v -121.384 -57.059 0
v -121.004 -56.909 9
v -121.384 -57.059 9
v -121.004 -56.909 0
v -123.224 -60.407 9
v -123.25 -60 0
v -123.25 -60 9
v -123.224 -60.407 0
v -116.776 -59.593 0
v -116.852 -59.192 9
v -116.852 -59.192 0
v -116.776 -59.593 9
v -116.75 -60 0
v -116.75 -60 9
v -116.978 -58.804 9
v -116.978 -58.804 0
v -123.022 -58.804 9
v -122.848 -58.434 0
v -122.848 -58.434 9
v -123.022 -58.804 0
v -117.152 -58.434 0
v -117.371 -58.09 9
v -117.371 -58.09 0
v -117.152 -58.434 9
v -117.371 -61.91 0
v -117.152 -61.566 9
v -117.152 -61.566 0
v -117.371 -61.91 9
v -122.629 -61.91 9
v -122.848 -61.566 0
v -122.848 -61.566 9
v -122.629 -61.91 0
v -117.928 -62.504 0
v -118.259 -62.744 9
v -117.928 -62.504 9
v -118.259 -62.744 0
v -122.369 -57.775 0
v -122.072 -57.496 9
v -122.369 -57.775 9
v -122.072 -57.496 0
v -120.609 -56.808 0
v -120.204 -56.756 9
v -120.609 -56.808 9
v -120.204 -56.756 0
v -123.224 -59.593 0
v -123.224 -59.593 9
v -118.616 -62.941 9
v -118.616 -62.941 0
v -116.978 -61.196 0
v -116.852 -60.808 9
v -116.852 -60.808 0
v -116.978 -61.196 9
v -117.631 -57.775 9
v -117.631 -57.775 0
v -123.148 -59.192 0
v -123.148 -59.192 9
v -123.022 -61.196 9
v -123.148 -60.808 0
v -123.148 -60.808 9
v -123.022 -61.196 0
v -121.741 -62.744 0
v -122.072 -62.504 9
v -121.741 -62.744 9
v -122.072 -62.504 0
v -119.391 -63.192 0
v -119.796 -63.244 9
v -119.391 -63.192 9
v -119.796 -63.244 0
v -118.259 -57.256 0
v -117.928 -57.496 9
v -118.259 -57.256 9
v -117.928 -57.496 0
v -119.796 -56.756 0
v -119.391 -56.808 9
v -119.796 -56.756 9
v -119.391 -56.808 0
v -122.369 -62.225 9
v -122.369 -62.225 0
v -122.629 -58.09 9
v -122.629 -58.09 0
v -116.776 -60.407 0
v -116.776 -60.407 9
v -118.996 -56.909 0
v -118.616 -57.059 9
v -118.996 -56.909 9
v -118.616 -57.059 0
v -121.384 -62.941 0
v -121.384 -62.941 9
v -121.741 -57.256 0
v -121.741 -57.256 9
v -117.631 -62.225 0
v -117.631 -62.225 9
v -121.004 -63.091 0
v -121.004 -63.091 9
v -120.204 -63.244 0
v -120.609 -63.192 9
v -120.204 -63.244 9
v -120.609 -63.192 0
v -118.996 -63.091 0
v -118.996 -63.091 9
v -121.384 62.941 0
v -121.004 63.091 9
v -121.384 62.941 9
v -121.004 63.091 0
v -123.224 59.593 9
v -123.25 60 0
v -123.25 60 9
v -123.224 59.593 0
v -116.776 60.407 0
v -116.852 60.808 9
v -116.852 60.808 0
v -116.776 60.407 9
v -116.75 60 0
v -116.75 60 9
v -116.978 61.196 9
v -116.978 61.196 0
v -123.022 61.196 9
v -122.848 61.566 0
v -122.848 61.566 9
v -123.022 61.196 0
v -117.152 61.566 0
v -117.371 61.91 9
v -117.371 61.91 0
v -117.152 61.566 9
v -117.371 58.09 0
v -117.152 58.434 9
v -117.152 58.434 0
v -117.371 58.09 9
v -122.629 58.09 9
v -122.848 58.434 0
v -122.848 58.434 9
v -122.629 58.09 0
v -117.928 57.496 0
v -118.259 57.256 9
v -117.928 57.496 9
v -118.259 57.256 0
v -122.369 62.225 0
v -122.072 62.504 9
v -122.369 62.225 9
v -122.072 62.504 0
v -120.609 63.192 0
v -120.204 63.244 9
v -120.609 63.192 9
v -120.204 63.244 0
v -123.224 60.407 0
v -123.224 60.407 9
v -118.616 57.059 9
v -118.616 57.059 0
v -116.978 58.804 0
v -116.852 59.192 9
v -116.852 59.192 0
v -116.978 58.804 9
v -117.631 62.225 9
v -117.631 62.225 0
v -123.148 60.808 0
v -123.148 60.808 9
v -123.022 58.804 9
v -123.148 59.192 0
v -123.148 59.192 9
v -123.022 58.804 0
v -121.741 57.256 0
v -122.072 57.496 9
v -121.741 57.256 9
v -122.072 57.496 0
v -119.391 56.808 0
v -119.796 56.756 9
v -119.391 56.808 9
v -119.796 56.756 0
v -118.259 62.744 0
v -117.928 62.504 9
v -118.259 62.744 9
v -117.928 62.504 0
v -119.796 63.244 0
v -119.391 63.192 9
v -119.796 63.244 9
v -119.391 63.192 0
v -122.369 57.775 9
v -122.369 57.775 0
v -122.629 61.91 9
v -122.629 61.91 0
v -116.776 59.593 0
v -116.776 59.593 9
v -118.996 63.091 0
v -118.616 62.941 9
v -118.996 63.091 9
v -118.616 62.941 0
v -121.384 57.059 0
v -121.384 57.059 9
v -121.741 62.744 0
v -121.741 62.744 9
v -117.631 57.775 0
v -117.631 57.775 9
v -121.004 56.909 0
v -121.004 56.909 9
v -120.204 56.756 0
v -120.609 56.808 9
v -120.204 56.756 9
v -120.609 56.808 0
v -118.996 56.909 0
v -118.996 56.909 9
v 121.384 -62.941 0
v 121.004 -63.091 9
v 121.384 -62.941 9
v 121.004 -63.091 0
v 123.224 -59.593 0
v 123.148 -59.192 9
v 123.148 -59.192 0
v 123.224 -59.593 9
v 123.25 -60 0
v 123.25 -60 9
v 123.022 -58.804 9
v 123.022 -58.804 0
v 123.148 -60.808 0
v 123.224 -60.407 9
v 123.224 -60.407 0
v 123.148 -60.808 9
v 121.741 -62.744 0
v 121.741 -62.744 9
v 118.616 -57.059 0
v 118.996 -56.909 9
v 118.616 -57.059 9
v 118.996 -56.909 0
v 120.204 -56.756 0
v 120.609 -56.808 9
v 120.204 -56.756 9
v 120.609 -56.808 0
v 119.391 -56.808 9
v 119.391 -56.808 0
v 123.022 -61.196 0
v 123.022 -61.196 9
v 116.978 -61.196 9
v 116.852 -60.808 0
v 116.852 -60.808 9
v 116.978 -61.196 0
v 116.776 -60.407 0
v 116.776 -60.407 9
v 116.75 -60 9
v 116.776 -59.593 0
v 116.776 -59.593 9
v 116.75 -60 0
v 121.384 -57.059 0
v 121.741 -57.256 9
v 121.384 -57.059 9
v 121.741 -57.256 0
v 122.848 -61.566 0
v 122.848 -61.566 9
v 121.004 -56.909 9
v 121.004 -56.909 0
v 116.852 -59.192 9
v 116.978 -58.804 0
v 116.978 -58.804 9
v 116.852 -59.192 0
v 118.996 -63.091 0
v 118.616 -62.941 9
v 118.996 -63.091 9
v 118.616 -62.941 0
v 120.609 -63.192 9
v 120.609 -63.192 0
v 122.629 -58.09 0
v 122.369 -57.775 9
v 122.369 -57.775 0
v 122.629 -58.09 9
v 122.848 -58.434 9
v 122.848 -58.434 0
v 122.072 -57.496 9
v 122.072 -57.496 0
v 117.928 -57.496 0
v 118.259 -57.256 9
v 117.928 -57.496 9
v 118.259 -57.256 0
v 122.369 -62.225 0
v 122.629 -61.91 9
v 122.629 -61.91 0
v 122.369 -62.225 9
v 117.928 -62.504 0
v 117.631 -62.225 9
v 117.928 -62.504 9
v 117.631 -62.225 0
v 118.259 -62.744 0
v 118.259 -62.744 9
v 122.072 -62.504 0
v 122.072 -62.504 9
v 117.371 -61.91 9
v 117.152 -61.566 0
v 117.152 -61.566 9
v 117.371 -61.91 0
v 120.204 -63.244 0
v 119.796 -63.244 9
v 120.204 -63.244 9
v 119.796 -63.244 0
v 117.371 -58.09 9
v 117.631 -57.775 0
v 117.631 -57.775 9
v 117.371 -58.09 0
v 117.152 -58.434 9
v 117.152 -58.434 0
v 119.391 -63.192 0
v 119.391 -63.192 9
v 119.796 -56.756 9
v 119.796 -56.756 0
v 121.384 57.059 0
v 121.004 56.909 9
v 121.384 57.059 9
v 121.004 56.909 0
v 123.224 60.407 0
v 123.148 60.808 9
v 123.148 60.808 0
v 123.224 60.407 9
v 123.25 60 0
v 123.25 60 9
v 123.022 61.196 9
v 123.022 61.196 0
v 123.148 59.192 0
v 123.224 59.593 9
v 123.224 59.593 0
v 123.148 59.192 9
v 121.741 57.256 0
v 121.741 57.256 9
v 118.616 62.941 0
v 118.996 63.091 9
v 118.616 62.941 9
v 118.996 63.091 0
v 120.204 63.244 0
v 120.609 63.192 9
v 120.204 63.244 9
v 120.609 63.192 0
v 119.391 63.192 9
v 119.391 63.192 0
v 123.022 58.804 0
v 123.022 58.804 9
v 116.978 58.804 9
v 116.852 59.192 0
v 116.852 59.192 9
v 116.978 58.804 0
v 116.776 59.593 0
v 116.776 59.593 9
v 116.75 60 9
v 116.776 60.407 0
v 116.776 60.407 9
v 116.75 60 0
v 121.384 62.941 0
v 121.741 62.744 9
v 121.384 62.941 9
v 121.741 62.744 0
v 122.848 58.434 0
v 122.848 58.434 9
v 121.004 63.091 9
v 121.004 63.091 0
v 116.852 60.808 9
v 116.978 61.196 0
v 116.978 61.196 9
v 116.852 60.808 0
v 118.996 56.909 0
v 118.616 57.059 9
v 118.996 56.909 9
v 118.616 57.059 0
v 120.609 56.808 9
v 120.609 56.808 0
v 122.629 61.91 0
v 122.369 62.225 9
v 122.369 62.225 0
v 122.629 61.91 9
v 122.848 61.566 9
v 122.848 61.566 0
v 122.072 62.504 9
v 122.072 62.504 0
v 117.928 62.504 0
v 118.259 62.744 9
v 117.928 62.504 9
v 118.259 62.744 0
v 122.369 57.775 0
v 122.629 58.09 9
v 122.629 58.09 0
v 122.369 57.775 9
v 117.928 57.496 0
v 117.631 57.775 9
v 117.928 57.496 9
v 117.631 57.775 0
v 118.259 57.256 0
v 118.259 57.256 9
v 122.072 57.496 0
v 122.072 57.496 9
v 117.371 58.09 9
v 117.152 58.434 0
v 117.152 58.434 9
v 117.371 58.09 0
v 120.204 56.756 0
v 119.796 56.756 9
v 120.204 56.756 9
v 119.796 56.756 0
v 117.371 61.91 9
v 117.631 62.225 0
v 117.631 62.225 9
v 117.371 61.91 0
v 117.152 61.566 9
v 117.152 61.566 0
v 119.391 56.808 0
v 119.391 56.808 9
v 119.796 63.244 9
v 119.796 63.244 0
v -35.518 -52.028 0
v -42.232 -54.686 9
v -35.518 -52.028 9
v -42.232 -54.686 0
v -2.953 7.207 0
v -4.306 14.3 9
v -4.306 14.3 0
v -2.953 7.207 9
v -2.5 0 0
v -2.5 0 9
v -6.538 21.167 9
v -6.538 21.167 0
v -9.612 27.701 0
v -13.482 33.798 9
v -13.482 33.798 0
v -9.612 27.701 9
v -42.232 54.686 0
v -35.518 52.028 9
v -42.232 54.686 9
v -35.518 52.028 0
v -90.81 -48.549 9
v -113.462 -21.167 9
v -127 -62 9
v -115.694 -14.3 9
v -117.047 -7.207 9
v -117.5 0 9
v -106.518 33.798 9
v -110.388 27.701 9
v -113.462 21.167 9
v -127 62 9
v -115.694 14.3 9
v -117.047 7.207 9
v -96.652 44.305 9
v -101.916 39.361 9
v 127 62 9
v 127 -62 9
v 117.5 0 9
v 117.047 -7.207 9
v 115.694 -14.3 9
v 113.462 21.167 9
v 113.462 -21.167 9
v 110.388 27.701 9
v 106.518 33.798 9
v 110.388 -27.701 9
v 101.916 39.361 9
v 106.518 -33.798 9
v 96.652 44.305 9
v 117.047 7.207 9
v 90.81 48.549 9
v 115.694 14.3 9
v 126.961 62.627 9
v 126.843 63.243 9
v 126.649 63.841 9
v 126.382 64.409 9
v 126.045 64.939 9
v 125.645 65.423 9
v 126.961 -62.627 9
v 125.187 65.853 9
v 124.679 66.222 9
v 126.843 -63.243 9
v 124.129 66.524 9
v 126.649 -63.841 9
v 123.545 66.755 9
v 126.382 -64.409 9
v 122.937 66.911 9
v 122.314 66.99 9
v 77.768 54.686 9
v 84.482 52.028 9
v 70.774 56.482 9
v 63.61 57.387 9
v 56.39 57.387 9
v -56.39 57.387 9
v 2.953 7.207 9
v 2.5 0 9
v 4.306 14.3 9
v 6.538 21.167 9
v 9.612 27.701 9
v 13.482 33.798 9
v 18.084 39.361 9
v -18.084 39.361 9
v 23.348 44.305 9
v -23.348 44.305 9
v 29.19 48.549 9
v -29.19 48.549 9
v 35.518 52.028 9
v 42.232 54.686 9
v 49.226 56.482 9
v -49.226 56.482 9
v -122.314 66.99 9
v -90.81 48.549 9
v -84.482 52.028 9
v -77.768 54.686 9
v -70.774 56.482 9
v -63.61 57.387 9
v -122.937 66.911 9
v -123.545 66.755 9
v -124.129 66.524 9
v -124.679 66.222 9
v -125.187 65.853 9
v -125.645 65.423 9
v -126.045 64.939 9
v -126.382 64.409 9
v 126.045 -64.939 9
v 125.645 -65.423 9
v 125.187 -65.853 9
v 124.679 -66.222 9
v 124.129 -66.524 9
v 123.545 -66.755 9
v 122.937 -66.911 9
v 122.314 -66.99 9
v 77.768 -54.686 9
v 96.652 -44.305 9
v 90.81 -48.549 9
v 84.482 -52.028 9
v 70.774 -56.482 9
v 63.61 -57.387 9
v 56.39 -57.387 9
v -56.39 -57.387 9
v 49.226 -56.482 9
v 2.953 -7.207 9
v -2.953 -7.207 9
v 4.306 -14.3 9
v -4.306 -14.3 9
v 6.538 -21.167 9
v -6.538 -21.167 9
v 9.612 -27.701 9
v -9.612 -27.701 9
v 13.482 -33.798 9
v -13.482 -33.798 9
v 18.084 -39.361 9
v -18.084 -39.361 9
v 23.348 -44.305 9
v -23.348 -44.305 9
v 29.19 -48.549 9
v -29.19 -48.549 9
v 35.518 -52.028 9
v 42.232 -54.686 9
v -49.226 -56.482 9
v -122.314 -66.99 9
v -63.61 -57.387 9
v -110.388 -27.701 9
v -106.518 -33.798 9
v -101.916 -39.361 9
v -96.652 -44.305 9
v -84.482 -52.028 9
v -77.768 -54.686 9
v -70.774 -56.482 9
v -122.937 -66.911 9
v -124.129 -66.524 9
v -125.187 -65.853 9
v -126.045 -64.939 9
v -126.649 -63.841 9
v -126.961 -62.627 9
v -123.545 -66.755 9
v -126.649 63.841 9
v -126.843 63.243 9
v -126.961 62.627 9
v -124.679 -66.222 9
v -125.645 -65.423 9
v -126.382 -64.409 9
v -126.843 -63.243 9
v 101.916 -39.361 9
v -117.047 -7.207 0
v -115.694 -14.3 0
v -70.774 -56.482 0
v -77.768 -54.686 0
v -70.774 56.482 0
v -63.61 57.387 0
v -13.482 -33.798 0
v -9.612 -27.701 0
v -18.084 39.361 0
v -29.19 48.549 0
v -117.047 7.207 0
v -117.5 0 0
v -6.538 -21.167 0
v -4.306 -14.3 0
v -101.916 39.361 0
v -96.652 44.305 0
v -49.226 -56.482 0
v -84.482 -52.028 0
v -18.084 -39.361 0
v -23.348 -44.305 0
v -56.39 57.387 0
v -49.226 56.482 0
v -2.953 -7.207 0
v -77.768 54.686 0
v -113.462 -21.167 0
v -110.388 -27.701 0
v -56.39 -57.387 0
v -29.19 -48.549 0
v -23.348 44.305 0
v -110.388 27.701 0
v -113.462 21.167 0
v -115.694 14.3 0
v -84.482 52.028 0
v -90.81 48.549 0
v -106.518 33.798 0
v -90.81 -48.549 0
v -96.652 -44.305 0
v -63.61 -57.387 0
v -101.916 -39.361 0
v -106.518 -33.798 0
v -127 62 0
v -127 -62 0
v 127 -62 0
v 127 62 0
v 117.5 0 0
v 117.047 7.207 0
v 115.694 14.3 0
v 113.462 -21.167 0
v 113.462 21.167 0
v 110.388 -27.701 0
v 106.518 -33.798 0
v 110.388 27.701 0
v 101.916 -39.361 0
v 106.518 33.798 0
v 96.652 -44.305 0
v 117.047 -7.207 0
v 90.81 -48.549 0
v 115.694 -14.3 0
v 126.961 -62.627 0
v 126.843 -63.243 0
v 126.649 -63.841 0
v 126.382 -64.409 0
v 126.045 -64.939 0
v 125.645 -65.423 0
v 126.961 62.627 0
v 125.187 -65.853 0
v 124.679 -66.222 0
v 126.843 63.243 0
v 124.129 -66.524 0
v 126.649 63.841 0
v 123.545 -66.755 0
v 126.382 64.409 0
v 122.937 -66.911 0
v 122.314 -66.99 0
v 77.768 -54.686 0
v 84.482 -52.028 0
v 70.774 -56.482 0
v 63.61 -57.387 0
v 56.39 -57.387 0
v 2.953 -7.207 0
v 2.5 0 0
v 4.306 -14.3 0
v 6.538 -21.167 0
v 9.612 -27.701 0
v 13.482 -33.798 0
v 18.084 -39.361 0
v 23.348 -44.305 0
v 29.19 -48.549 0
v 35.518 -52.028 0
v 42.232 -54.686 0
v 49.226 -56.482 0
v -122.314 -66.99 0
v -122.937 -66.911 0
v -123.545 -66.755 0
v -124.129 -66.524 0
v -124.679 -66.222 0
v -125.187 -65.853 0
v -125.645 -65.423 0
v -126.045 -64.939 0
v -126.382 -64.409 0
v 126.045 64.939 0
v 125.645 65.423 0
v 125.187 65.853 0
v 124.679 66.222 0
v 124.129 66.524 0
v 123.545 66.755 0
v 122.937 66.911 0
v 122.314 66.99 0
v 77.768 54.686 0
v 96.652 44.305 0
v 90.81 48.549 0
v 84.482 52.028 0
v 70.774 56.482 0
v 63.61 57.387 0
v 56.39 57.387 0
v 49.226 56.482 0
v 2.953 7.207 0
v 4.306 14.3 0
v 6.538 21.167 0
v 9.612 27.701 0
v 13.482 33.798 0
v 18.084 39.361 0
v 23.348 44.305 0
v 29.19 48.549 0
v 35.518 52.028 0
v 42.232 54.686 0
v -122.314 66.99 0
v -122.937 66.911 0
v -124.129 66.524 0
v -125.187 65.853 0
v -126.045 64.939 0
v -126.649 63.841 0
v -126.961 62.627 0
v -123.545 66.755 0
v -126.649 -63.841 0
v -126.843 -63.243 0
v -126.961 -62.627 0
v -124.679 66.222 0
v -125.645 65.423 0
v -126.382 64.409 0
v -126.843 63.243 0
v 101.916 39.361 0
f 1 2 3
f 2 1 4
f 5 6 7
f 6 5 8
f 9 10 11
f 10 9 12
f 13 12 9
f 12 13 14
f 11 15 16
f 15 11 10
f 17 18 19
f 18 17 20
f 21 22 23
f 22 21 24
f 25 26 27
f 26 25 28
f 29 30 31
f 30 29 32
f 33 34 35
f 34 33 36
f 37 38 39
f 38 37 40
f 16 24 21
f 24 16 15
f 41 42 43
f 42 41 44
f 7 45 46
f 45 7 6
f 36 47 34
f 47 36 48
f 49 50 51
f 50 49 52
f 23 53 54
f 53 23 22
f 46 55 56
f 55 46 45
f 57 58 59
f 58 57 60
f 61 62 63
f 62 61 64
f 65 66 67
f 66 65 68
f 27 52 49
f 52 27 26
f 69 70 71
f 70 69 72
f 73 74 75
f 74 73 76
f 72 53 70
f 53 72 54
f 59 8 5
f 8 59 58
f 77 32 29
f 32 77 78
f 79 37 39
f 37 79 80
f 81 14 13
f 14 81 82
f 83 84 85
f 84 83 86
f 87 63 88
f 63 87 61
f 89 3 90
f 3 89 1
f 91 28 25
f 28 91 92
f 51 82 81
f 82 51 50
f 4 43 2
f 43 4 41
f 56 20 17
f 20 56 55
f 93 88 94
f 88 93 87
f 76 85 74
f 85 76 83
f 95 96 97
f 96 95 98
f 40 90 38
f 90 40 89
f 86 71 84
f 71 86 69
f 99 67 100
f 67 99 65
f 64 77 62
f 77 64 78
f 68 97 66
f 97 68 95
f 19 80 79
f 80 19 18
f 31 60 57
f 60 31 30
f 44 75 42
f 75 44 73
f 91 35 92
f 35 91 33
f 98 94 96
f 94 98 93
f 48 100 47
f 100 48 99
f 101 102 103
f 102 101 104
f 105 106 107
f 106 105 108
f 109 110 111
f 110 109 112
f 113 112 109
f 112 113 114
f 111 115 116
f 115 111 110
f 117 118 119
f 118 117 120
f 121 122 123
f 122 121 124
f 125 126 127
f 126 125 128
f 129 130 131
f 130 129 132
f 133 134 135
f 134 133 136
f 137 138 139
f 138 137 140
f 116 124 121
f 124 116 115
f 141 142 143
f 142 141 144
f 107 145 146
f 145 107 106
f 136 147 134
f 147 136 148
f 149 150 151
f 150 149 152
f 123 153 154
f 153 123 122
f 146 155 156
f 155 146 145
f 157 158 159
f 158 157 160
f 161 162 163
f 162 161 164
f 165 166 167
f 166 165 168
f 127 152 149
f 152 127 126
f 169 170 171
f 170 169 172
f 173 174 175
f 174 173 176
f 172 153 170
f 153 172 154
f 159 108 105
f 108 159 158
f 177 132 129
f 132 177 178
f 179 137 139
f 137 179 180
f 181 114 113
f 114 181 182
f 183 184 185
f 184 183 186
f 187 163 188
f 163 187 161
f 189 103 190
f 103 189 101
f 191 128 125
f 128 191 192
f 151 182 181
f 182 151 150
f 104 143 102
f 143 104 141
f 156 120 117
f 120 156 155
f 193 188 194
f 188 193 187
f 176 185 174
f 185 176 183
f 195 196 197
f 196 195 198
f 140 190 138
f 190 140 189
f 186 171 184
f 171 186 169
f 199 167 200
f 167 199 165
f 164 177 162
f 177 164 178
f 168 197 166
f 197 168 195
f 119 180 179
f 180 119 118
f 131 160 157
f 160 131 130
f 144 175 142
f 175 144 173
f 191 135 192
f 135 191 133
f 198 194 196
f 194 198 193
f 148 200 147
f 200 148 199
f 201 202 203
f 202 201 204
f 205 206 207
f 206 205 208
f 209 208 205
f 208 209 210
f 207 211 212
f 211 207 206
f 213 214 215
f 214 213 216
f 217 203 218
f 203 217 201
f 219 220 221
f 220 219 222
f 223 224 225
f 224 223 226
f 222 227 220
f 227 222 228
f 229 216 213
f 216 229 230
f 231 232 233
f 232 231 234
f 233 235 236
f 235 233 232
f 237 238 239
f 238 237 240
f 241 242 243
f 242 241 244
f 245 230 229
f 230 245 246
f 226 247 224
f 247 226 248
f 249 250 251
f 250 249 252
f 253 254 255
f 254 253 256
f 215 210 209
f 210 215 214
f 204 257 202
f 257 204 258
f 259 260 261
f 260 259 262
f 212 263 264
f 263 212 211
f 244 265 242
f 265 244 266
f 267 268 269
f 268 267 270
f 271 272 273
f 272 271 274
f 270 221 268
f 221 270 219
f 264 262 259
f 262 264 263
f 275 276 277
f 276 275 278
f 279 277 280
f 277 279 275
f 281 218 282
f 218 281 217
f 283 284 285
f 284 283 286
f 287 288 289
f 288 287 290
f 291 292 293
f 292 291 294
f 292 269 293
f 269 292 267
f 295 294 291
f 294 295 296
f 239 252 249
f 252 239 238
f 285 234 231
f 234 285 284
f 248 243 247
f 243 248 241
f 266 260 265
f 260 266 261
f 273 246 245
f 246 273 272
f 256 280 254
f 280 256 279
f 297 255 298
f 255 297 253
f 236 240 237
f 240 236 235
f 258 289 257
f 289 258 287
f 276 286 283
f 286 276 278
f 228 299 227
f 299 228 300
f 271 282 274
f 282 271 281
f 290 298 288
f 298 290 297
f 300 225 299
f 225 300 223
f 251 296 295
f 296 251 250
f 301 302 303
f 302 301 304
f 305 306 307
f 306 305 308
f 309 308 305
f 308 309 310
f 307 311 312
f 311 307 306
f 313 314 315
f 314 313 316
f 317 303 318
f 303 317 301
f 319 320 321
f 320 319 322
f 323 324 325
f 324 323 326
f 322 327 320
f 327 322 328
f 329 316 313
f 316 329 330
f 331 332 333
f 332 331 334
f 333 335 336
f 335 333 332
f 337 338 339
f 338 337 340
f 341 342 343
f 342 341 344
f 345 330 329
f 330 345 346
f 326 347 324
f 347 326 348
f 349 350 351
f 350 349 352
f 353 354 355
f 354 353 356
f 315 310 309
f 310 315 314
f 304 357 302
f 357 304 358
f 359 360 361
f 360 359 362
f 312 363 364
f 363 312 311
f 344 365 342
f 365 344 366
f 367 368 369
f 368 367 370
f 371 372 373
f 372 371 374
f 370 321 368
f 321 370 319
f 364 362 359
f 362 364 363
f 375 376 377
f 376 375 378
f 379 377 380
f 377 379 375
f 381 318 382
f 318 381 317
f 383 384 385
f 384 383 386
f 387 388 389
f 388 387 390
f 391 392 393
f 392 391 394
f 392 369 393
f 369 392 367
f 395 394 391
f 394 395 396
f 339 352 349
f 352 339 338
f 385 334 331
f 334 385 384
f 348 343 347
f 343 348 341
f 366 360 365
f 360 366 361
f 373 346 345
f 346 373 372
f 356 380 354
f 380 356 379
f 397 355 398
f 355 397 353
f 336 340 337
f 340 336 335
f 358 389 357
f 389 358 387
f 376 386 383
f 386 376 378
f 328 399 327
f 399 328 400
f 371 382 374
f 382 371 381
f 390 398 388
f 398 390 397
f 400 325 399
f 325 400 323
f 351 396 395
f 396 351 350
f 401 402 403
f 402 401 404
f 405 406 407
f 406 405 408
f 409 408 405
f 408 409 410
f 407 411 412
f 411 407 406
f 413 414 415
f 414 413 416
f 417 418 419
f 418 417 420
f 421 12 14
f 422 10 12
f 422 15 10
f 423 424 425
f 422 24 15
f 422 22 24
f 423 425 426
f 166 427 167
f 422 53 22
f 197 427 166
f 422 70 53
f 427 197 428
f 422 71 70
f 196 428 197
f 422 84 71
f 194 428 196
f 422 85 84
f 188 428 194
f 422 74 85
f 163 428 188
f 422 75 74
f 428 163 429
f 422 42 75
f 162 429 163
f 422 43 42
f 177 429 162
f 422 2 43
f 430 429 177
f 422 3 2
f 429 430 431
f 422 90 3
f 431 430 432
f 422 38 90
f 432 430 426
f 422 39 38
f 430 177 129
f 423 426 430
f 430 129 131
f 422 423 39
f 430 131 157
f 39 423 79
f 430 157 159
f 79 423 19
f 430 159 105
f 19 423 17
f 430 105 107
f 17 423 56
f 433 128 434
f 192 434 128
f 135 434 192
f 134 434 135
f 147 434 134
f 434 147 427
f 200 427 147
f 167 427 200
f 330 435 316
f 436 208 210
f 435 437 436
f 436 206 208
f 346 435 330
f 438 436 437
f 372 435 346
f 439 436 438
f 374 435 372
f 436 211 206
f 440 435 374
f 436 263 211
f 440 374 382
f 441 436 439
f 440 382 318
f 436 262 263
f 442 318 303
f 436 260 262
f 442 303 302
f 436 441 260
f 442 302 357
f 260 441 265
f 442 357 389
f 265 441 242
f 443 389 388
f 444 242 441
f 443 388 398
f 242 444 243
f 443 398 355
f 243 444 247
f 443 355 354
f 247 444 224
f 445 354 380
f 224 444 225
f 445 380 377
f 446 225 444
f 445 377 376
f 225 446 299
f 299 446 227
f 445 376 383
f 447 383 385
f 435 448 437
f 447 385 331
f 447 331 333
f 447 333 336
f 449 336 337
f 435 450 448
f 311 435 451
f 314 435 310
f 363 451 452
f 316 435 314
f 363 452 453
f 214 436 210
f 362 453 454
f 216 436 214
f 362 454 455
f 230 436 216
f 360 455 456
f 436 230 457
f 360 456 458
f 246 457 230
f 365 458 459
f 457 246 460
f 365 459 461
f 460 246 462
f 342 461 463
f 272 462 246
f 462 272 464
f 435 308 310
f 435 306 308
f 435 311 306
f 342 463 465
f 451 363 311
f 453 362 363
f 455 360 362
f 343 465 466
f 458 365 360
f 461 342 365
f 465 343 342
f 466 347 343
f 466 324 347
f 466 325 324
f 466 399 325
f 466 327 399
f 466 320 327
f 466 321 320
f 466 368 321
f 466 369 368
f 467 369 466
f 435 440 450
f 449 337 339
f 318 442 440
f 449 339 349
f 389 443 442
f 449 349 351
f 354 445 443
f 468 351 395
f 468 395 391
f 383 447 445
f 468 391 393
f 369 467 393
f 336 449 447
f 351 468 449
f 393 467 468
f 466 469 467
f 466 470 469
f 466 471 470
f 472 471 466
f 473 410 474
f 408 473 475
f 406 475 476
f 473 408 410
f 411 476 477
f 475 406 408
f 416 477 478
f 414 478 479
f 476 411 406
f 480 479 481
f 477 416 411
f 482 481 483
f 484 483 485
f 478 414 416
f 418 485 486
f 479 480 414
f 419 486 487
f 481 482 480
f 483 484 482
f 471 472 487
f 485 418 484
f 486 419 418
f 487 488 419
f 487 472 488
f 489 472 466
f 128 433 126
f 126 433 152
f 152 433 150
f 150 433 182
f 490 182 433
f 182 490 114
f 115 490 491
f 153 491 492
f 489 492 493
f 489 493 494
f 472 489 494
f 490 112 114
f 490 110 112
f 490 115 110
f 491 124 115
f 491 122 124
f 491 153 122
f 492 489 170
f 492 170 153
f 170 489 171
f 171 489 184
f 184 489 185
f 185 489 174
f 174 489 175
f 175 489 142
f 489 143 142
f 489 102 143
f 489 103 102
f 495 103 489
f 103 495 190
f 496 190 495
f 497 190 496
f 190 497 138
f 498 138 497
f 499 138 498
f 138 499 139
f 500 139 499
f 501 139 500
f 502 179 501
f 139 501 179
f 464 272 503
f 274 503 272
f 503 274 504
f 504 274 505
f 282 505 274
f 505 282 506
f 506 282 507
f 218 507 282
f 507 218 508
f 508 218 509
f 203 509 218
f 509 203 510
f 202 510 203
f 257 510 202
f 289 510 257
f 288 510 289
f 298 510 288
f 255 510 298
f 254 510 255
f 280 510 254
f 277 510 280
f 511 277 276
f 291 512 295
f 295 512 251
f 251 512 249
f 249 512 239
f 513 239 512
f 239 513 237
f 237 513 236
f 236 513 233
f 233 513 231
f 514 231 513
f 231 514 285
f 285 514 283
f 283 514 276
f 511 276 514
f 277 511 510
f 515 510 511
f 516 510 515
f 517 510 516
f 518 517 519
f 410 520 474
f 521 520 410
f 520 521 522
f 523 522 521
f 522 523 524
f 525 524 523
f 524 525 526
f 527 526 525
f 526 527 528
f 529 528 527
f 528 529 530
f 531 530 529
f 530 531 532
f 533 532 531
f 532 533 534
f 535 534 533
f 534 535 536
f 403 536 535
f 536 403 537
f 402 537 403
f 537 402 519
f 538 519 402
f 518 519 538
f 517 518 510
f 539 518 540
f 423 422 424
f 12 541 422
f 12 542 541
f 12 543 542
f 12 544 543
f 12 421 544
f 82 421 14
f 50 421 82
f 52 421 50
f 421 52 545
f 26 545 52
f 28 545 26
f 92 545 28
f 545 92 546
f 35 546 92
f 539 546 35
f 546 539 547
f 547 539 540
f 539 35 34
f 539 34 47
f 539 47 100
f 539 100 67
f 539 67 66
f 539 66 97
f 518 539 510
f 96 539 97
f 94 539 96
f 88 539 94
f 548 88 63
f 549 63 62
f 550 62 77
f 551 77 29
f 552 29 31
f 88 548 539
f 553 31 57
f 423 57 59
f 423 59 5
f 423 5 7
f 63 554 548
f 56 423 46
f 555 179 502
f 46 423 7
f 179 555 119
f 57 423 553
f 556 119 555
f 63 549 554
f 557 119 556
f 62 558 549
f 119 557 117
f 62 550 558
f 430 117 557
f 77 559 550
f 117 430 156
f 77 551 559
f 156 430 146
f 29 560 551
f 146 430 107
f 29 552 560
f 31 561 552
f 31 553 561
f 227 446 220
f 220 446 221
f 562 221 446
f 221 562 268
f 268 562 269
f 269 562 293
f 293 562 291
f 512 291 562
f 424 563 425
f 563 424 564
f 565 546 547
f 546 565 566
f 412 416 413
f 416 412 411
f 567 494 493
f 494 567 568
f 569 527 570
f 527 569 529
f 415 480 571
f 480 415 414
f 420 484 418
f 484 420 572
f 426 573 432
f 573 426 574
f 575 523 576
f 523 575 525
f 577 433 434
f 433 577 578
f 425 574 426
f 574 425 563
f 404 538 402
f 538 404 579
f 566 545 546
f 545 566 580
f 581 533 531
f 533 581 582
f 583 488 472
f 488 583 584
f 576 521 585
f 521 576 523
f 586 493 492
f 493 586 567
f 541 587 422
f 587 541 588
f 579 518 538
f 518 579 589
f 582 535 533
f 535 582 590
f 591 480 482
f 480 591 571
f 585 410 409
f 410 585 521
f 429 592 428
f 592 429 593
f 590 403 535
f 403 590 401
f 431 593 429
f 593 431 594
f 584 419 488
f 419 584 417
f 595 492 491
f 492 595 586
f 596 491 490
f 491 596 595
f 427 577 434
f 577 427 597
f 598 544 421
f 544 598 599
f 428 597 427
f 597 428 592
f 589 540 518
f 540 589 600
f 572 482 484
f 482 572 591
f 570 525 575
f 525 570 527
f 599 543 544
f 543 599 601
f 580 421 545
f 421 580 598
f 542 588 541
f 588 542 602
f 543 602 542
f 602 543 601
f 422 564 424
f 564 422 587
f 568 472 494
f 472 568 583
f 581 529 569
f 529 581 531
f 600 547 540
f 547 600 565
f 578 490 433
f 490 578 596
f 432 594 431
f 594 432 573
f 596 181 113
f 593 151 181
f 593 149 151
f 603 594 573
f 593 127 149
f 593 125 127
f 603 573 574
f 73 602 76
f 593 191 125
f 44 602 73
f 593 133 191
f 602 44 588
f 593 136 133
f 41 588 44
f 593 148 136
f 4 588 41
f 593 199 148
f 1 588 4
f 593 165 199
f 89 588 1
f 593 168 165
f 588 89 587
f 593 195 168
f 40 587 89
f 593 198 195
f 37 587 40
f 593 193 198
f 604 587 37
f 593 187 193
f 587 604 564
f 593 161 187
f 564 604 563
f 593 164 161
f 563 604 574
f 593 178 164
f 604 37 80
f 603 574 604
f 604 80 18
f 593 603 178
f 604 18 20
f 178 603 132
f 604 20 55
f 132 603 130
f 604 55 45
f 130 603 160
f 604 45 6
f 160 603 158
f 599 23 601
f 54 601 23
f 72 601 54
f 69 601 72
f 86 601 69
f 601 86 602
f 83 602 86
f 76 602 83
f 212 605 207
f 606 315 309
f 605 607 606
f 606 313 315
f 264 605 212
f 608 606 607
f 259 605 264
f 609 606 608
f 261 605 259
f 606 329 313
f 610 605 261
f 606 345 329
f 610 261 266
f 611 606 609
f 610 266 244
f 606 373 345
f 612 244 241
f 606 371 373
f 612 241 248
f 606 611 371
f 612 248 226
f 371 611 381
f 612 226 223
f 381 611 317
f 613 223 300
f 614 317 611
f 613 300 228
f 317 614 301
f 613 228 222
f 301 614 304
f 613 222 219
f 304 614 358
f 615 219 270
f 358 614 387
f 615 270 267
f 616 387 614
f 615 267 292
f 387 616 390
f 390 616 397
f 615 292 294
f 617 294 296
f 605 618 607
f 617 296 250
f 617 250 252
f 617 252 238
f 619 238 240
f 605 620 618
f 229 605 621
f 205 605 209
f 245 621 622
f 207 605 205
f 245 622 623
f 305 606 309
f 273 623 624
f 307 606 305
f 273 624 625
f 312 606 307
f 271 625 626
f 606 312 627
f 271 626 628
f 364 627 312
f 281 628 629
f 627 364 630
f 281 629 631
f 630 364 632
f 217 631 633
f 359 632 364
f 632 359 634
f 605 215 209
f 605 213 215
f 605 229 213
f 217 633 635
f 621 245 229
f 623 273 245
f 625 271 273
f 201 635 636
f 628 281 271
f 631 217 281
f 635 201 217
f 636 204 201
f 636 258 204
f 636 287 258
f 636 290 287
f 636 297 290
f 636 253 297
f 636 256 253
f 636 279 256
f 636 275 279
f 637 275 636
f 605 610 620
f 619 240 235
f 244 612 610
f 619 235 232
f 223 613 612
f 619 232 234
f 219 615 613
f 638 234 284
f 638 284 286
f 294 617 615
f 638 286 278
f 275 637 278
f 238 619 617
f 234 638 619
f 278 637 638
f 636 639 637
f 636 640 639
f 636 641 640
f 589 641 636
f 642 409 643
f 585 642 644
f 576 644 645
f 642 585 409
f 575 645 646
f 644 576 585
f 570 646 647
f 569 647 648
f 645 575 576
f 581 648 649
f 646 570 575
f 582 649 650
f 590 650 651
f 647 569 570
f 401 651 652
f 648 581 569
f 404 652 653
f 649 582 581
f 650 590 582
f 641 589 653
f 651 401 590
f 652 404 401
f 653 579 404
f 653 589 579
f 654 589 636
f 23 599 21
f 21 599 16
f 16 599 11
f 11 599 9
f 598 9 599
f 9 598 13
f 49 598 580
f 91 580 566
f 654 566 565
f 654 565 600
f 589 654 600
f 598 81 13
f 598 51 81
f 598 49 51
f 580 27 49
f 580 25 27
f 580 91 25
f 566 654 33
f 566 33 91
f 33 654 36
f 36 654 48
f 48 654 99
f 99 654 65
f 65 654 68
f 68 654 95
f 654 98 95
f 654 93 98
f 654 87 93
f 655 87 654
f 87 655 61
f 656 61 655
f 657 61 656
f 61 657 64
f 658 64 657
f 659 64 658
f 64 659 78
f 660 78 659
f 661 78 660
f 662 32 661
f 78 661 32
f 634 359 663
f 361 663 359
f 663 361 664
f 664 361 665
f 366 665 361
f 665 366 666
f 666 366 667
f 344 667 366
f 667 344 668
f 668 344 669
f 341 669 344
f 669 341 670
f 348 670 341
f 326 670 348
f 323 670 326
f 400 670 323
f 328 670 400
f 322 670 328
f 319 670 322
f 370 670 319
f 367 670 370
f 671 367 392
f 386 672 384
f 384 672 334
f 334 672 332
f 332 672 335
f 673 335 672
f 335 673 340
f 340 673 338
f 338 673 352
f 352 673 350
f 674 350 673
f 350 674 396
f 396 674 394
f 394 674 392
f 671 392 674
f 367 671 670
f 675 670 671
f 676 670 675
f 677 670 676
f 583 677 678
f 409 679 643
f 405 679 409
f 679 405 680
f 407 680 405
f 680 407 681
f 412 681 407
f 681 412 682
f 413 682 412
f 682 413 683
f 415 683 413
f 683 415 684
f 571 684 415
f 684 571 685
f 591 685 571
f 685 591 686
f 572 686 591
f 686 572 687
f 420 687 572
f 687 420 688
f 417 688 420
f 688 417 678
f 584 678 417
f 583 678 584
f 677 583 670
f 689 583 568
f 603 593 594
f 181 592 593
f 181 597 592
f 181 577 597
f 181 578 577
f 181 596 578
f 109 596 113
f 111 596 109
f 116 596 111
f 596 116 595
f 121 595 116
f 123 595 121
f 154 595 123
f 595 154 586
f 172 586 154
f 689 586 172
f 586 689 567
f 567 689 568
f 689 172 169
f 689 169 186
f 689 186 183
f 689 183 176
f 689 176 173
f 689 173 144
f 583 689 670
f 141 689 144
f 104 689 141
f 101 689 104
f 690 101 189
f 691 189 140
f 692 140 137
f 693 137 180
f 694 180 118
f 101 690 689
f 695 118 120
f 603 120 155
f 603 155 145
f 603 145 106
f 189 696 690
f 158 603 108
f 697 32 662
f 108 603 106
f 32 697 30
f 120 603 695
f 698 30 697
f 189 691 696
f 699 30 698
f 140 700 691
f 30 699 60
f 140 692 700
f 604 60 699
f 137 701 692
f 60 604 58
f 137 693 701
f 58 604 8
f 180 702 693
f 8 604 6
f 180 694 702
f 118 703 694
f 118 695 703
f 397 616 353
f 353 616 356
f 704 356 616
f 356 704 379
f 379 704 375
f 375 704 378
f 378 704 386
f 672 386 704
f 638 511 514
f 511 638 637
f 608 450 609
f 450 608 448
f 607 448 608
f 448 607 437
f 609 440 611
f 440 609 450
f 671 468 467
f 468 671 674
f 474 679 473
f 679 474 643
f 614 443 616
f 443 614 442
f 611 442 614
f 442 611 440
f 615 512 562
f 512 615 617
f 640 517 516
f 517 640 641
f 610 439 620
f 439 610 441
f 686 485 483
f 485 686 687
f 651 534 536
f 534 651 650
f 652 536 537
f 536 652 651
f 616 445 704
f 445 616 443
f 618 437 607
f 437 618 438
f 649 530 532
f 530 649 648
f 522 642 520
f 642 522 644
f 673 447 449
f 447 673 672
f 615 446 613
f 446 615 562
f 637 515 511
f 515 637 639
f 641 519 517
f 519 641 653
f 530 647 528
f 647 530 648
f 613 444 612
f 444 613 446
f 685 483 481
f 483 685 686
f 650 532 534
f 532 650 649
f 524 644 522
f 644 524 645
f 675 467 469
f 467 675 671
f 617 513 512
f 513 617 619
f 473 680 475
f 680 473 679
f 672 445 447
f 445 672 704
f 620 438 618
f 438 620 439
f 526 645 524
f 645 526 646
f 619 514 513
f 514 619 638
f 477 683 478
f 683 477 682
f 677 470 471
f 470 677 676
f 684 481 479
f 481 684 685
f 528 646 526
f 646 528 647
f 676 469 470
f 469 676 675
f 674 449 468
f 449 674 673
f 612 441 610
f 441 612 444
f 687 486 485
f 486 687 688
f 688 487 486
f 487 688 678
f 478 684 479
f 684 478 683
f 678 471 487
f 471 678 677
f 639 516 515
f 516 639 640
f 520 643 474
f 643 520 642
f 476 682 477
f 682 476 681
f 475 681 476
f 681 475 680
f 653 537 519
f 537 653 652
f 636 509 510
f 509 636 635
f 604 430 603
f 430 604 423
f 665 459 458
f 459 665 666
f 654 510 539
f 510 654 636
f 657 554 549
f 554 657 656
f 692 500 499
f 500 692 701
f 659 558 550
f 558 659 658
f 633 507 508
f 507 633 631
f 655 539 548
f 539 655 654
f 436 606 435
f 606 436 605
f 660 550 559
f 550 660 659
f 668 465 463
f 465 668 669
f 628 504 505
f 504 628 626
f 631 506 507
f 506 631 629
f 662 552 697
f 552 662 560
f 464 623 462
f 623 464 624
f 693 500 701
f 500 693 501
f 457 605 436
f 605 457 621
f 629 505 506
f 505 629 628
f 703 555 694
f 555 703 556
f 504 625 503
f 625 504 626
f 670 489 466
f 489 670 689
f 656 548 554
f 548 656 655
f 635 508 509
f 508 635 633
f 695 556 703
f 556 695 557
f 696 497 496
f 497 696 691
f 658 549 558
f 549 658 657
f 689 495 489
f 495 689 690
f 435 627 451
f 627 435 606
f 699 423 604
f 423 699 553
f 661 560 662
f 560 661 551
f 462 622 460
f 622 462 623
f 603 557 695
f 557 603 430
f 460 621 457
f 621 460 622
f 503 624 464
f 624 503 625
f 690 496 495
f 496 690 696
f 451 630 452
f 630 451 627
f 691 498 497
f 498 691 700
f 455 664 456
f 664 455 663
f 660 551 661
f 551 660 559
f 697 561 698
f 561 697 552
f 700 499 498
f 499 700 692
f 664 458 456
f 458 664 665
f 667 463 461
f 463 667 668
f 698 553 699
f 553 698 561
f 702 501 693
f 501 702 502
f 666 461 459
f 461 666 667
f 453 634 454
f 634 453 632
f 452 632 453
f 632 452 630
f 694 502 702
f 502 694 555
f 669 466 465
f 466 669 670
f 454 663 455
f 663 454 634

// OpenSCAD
$fn = 50;


difference() {
	union() {
		hull() {
			translate(v = [-122.0000000000, 62.0000000000, 0]) {
				cylinder(h = 9, r = 5);
			}
			translate(v = [122.0000000000, 62.0000000000, 0]) {
				cylinder(h = 9, r = 5);
			}
			translate(v = [-122.0000000000, -62.0000000000, 0]) {
				cylinder(h = 9, r = 5);
			}
			translate(v = [122.0000000000, -62.0000000000, 0]) {
				cylinder(h = 9, r = 5);
			}
		}
	}
	union() {
		#translate(v = [-120.0000000000, -60.0000000000, -100.0000000000]) {
			cylinder(h = 200, r = 3.2500000000);
		}
		#translate(v = [-120.0000000000, 60.0000000000, -100.0000000000]) {
			cylinder(h = 200, r = 3.2500000000);
		}
		#translate(v = [120.0000000000, -60.0000000000, -100.0000000000]) {
			cylinder(h = 200, r = 3.2500000000);
		}
		#translate(v = [120.0000000000, 60.0000000000, -100.0000000000]) {
			cylinder(h = 200, r = 3.2500000000);
		}
		#translate(v = [-60.0000000000, 0, 0]) {
			cylinder(h = 9, r = 57.5000000000);
		}
		#translate(v = [60.0000000000, 0, 0]) {
			cylinder(h = 9, r = 57.5000000000);
		}
	}
}
